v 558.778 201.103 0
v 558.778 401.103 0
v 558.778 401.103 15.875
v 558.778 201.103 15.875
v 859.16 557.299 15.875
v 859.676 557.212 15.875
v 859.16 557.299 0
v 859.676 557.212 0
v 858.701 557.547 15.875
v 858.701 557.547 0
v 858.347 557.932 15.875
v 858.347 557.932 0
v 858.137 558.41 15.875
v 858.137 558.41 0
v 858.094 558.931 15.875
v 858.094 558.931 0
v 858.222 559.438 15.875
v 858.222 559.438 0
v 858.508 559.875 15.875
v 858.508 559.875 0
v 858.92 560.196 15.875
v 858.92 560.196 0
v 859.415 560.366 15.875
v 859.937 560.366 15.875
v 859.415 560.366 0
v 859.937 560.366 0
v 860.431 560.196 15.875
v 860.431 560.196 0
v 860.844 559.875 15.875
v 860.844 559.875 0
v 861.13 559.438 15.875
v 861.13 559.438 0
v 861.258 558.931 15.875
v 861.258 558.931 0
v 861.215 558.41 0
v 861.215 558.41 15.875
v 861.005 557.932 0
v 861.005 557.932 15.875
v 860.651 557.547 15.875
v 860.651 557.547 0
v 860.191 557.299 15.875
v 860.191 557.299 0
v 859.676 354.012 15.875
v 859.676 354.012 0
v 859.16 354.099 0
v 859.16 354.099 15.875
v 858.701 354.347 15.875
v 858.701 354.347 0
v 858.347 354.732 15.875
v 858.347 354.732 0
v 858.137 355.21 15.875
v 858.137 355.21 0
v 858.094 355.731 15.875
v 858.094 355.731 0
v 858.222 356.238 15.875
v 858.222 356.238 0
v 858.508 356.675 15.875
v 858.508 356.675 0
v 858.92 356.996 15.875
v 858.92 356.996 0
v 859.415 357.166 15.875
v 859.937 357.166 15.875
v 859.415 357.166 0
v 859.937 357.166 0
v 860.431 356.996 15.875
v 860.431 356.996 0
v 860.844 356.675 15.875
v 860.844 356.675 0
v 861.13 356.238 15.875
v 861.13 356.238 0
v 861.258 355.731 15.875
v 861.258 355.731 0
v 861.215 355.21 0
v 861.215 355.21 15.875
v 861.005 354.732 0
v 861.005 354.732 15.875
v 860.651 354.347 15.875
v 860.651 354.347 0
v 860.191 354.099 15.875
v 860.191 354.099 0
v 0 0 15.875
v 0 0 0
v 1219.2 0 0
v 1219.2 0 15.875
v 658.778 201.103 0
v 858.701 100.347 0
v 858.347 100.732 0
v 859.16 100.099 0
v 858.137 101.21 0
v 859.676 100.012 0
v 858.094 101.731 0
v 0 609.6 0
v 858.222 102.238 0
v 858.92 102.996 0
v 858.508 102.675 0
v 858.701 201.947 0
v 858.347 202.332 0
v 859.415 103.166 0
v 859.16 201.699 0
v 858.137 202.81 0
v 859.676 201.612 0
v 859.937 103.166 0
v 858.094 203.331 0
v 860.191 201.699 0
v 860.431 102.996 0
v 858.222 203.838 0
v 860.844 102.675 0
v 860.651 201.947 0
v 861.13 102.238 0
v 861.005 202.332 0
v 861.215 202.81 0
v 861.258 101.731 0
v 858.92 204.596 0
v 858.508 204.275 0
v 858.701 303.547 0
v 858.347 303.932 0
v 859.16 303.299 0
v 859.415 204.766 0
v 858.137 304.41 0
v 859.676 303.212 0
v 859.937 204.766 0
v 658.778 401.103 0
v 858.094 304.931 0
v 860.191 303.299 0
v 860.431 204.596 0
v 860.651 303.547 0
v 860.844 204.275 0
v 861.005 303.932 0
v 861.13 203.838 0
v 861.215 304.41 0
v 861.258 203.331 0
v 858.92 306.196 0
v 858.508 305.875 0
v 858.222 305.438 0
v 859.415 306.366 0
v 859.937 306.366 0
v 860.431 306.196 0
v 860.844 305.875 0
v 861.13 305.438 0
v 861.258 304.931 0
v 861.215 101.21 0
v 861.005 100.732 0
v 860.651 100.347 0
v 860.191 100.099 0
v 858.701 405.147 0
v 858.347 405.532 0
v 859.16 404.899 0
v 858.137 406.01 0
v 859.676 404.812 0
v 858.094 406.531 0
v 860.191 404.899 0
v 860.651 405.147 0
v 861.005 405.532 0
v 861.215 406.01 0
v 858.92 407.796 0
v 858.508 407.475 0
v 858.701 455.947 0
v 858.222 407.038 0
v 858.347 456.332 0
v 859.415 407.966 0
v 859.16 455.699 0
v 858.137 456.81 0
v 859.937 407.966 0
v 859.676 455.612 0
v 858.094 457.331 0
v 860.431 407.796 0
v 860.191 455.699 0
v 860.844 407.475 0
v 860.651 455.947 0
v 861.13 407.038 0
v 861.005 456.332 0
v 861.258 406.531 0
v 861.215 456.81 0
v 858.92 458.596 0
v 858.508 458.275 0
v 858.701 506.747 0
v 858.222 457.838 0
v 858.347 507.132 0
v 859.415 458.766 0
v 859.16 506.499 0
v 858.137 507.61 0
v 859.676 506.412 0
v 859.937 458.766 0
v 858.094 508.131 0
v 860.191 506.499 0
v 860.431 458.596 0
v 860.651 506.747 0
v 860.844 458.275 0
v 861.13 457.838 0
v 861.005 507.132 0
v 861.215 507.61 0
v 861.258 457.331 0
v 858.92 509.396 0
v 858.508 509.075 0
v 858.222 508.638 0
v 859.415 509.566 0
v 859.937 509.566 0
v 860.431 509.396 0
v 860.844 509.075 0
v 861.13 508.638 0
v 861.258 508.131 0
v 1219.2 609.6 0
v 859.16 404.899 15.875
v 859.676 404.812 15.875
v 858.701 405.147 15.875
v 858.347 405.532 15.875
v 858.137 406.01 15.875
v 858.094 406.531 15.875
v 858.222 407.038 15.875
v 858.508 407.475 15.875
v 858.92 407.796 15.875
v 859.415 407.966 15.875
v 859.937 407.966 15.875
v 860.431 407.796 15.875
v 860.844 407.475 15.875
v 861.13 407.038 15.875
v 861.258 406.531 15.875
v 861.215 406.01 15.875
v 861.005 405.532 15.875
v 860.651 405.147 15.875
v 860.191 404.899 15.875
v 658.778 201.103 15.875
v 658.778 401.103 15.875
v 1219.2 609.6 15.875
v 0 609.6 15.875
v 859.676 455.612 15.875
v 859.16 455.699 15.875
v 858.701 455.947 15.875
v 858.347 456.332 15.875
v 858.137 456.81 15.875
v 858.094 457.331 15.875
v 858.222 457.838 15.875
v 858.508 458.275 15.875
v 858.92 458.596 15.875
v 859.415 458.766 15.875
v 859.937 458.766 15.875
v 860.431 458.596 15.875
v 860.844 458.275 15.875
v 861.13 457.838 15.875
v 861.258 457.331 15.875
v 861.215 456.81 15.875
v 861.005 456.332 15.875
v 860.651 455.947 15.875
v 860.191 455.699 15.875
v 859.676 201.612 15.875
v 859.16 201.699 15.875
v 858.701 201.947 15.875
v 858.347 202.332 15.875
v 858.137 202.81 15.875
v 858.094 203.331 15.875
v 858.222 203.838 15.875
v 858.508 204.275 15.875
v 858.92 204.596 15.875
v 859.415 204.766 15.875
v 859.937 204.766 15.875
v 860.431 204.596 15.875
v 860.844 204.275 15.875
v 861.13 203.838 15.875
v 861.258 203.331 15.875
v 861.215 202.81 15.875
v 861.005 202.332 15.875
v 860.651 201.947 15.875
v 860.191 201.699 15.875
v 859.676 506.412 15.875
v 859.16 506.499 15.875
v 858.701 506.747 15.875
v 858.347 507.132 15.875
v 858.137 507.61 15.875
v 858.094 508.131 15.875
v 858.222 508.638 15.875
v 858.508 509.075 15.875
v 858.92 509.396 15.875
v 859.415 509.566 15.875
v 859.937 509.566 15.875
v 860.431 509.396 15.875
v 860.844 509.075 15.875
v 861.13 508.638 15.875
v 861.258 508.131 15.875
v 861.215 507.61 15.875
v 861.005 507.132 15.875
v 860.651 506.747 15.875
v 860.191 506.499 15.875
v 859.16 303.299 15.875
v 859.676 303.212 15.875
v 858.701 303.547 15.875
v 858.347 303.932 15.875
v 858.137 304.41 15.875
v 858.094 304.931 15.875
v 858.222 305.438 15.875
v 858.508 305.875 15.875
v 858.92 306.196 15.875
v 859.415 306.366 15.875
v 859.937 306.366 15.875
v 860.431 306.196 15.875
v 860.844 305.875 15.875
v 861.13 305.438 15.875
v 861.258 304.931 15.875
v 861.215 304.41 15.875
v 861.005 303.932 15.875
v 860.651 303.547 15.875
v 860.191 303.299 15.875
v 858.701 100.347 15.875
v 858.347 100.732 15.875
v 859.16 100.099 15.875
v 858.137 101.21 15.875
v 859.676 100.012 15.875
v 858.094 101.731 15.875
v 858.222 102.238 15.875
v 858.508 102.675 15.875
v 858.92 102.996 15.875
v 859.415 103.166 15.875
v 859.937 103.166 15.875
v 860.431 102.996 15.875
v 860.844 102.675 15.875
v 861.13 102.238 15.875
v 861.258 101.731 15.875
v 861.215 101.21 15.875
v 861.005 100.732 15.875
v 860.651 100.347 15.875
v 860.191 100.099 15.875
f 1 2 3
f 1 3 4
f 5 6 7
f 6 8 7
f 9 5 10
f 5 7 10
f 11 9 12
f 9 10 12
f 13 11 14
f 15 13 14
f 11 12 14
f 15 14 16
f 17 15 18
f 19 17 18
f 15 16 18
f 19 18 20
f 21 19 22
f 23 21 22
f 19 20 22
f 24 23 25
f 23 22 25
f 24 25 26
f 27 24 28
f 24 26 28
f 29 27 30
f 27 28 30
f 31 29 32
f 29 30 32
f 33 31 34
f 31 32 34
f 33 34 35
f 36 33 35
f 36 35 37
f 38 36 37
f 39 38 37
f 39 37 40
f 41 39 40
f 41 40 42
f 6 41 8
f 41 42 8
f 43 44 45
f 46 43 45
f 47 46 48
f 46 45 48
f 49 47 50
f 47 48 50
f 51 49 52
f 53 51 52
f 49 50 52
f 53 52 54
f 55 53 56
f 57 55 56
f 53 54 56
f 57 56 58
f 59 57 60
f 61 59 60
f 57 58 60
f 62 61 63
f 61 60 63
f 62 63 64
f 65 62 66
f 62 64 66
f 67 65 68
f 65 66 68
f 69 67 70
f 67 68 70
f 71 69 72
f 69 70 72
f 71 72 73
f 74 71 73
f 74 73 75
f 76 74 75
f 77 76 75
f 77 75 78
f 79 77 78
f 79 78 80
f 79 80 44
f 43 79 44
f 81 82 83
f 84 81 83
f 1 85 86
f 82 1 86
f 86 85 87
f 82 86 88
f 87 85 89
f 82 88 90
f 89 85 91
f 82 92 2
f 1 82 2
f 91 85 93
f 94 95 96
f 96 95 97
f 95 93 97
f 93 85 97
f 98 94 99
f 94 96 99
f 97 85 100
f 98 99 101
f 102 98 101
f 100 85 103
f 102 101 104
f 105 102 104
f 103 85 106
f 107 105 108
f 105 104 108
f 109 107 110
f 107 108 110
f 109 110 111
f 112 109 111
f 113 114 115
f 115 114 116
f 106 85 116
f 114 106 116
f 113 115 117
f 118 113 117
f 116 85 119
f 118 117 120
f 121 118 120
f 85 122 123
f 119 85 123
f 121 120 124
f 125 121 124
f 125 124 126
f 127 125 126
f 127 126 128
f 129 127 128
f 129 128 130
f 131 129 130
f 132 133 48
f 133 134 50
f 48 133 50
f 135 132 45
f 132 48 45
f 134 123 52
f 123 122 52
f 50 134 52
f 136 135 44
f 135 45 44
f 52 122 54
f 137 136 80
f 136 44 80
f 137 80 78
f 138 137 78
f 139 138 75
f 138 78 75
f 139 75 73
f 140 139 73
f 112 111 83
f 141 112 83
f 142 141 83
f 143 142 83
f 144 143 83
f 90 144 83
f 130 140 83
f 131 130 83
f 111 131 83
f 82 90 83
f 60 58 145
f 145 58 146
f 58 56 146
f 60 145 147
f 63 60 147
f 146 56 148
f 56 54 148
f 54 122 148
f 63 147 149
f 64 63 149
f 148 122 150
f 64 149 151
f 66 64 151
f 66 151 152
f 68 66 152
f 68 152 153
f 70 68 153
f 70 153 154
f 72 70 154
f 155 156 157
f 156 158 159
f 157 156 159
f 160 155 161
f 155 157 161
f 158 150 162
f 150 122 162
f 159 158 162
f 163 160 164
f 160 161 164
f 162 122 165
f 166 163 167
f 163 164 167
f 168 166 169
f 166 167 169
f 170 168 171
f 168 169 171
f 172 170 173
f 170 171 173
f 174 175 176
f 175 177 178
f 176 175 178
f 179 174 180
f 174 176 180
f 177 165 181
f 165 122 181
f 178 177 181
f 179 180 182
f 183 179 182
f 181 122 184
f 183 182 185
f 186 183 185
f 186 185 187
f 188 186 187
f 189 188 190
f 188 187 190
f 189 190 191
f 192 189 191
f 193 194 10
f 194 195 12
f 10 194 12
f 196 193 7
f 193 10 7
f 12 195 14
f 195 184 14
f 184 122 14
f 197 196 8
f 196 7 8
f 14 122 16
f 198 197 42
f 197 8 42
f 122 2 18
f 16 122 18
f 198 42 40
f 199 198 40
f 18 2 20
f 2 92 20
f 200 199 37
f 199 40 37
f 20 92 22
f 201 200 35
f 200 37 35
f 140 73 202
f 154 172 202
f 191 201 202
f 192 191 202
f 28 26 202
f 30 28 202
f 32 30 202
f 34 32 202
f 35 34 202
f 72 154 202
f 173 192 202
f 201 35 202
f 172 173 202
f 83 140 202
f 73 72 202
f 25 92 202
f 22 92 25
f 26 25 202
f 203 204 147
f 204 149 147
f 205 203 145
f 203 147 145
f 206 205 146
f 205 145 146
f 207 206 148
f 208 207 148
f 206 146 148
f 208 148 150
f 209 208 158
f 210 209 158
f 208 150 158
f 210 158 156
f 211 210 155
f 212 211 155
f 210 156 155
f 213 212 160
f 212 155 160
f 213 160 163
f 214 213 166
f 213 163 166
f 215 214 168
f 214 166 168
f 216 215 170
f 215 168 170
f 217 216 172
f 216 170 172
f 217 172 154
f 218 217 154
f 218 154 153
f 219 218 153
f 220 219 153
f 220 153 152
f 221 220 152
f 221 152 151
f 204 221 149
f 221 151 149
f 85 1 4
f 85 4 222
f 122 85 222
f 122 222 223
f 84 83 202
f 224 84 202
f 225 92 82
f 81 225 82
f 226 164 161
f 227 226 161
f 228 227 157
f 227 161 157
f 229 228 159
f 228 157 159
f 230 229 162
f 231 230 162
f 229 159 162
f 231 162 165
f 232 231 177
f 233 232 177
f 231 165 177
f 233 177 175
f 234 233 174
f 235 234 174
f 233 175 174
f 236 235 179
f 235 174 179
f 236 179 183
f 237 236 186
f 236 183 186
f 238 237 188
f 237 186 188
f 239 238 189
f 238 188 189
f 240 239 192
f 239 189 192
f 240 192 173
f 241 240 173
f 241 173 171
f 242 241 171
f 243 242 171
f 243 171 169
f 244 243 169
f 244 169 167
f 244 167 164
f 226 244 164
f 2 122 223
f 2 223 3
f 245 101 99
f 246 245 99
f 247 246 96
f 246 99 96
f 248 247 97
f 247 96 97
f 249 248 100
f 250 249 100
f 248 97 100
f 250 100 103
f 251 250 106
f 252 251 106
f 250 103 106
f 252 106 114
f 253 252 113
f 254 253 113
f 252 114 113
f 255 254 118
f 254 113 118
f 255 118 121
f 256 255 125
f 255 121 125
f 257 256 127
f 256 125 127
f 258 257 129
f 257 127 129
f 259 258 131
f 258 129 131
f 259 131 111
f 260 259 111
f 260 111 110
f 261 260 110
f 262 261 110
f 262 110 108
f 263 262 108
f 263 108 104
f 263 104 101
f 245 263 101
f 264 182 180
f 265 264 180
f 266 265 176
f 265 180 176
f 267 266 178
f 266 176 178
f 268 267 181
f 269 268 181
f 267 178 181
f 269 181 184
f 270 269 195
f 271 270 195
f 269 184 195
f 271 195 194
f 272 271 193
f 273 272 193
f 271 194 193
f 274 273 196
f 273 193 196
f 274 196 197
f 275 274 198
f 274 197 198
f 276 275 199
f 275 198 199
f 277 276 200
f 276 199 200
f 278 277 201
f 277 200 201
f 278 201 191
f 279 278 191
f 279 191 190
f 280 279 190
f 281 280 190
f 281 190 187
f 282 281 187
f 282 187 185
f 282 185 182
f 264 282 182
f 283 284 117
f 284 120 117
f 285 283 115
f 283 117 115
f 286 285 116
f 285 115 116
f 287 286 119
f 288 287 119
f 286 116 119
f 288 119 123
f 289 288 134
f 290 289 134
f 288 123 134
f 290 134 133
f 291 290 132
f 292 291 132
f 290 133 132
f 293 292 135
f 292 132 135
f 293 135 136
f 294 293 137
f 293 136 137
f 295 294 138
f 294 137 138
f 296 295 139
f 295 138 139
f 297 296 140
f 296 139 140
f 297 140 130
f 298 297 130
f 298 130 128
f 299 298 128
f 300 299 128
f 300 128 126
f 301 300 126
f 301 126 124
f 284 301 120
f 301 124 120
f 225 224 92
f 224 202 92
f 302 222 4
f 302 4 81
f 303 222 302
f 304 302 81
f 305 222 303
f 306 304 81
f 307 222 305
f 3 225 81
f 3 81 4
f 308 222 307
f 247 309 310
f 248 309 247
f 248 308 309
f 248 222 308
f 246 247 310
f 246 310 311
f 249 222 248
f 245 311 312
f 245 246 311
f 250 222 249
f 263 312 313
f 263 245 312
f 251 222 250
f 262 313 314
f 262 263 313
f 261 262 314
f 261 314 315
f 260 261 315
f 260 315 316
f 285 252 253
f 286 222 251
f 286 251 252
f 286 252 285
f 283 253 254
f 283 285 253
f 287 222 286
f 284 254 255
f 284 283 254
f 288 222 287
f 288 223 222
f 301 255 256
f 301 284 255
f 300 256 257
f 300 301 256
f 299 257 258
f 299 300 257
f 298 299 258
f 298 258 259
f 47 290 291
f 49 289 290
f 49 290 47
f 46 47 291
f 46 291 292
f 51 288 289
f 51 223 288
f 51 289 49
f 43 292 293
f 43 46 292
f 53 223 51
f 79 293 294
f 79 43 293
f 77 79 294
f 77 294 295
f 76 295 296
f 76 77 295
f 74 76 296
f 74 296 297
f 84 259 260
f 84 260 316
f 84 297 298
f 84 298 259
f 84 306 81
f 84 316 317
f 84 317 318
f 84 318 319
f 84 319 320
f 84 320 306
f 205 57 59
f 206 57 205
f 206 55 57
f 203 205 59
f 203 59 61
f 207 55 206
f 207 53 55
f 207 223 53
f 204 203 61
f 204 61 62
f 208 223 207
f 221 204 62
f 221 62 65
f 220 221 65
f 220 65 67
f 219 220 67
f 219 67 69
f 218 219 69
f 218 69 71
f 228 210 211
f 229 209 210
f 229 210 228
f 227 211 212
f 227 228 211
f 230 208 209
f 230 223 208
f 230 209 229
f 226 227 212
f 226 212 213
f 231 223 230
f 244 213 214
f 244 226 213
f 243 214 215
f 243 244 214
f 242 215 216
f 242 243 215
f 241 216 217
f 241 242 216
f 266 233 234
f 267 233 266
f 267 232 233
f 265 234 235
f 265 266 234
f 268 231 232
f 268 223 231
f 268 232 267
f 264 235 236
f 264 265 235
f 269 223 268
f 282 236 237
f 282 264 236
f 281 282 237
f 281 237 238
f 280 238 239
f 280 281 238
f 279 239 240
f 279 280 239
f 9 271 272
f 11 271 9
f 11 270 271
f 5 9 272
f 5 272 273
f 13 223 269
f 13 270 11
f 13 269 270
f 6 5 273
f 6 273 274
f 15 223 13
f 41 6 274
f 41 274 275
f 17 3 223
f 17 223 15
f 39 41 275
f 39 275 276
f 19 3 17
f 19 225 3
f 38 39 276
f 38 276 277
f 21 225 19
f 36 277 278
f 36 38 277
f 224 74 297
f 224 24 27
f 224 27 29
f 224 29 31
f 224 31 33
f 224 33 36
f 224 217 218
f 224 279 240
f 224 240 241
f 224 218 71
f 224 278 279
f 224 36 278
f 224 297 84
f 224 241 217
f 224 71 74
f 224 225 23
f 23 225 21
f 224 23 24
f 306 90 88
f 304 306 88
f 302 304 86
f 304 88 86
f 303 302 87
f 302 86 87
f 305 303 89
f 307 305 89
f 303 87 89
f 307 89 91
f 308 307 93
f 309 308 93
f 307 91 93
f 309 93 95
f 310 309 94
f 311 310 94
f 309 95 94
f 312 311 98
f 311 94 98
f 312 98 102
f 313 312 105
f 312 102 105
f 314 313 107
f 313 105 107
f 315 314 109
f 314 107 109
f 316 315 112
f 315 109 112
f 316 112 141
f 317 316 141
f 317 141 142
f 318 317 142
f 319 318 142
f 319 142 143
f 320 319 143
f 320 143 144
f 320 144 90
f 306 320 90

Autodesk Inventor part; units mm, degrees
ref_plane "YZ Plane" through (0, 0, 0) normal (1, 0, 0) x (0, 1, 0)
ref_plane "XZ Plane" through (0, 0, 0) normal (0, 1, 0) x (-1, 0, 0)
ref_plane "XY Plane" through (0, 0, 0) normal (0, 0, 1) x (1, 0, 0)
sketch "Sketch1" plane through (0, 0, 0) normal (0, 0, 1) x (1, 0, 0)
  line L0 (0, 0) -> (1219.2, 0)
  line L1 (1219.2, 0) -> (1219.2, 609.6)
  line L2 (1219.2, 609.6) -> (0, 609.6)
  line L3 (0, 609.6) -> (0, 0)
  line L4 (658.7784, 301.1028) -> (658.7784, 401.1028)
  line L5 (658.7784, 401.1028) -> (558.7784, 401.1028)
  line L6 (558.7784, 401.1028) -> (558.7784, 201.1028)
  line L7 (558.7784, 201.1028) -> (658.7784, 201.1028)
  line L8 (658.7784, 201.1028) -> (658.7784, 301.1028)
  dimension "d0" = 1219.2
  dimension "d1" = 609.6
  dimension "d4" = 100
  dimension "d5" = 100
  dimension "d6" = 200
  dimension "d7" = 100
extrude "Extrusion1" add sketch "Sketch1" along normal blind 15.875
sketch "Sketch2" plane through (0, 0, 15.875) normal (0, 0, 1) x (1, 0, 0)
  line L0 (658.7784, 201.1028) -> (558.7784, 201.1028) projected
  line L1 (558.7784, 201.1028) -> (558.7784, 401.1028) projected
  line L2 (558.7784, 401.1028) -> (658.7784, 401.1028) projected
  line L3 (658.7784, 401.1028) -> (658.7784, 201.1028) projected
  line L4 (0, 0) -> (1219.2, 0) projected
  line L5 (1219.2, 0) -> (1219.2, 609.6) projected
  line L6 (1219.2, 609.6) -> (0, 609.6) projected
  line L7 (0, 609.6) -> (0, 0) projected
sketch "Sketch3" plane through (0, 0, 15.875) normal (0, 0, 1) x (1, 0, 0)
  line L0 (0, 0) -> (859.6758, 0)
  line L1 (0, 0) -> (1219.2, 0) projected
  line L2 (1219.2, 609.6) -> (0, 609.6) projected
  line L3 (859.6758, 0) -> (961.2758, 0) construction
  point P0 (859.6758, 101.6)
  point P1 (859.6758, 203.2)
  point P2 (859.6758, 304.8)
  point P3 (859.6758, 355.6)
  point P4 (859.6758, 406.4)
  point P5 (859.6758, 457.2)
  point P6 (859.6758, 508)
  point P7 (859.6758, 558.8)
hole "Hole1" at (859.6758, 101.6, 15.875) at (859.6758, 203.2, 15.875) at (859.6758, 304.8, 15.875) at (859.6758, 355.6, 15.875) at (859.6758, 406.4, 15.875) at (859.6758, 457.2, 15.875) at (859.6758, 508, 15.875) at (859.6758, 558.8, 15.875) direction (0, 0, -1) diameter 3.175 end through all
properties part number "model 2 upper comp front window"
